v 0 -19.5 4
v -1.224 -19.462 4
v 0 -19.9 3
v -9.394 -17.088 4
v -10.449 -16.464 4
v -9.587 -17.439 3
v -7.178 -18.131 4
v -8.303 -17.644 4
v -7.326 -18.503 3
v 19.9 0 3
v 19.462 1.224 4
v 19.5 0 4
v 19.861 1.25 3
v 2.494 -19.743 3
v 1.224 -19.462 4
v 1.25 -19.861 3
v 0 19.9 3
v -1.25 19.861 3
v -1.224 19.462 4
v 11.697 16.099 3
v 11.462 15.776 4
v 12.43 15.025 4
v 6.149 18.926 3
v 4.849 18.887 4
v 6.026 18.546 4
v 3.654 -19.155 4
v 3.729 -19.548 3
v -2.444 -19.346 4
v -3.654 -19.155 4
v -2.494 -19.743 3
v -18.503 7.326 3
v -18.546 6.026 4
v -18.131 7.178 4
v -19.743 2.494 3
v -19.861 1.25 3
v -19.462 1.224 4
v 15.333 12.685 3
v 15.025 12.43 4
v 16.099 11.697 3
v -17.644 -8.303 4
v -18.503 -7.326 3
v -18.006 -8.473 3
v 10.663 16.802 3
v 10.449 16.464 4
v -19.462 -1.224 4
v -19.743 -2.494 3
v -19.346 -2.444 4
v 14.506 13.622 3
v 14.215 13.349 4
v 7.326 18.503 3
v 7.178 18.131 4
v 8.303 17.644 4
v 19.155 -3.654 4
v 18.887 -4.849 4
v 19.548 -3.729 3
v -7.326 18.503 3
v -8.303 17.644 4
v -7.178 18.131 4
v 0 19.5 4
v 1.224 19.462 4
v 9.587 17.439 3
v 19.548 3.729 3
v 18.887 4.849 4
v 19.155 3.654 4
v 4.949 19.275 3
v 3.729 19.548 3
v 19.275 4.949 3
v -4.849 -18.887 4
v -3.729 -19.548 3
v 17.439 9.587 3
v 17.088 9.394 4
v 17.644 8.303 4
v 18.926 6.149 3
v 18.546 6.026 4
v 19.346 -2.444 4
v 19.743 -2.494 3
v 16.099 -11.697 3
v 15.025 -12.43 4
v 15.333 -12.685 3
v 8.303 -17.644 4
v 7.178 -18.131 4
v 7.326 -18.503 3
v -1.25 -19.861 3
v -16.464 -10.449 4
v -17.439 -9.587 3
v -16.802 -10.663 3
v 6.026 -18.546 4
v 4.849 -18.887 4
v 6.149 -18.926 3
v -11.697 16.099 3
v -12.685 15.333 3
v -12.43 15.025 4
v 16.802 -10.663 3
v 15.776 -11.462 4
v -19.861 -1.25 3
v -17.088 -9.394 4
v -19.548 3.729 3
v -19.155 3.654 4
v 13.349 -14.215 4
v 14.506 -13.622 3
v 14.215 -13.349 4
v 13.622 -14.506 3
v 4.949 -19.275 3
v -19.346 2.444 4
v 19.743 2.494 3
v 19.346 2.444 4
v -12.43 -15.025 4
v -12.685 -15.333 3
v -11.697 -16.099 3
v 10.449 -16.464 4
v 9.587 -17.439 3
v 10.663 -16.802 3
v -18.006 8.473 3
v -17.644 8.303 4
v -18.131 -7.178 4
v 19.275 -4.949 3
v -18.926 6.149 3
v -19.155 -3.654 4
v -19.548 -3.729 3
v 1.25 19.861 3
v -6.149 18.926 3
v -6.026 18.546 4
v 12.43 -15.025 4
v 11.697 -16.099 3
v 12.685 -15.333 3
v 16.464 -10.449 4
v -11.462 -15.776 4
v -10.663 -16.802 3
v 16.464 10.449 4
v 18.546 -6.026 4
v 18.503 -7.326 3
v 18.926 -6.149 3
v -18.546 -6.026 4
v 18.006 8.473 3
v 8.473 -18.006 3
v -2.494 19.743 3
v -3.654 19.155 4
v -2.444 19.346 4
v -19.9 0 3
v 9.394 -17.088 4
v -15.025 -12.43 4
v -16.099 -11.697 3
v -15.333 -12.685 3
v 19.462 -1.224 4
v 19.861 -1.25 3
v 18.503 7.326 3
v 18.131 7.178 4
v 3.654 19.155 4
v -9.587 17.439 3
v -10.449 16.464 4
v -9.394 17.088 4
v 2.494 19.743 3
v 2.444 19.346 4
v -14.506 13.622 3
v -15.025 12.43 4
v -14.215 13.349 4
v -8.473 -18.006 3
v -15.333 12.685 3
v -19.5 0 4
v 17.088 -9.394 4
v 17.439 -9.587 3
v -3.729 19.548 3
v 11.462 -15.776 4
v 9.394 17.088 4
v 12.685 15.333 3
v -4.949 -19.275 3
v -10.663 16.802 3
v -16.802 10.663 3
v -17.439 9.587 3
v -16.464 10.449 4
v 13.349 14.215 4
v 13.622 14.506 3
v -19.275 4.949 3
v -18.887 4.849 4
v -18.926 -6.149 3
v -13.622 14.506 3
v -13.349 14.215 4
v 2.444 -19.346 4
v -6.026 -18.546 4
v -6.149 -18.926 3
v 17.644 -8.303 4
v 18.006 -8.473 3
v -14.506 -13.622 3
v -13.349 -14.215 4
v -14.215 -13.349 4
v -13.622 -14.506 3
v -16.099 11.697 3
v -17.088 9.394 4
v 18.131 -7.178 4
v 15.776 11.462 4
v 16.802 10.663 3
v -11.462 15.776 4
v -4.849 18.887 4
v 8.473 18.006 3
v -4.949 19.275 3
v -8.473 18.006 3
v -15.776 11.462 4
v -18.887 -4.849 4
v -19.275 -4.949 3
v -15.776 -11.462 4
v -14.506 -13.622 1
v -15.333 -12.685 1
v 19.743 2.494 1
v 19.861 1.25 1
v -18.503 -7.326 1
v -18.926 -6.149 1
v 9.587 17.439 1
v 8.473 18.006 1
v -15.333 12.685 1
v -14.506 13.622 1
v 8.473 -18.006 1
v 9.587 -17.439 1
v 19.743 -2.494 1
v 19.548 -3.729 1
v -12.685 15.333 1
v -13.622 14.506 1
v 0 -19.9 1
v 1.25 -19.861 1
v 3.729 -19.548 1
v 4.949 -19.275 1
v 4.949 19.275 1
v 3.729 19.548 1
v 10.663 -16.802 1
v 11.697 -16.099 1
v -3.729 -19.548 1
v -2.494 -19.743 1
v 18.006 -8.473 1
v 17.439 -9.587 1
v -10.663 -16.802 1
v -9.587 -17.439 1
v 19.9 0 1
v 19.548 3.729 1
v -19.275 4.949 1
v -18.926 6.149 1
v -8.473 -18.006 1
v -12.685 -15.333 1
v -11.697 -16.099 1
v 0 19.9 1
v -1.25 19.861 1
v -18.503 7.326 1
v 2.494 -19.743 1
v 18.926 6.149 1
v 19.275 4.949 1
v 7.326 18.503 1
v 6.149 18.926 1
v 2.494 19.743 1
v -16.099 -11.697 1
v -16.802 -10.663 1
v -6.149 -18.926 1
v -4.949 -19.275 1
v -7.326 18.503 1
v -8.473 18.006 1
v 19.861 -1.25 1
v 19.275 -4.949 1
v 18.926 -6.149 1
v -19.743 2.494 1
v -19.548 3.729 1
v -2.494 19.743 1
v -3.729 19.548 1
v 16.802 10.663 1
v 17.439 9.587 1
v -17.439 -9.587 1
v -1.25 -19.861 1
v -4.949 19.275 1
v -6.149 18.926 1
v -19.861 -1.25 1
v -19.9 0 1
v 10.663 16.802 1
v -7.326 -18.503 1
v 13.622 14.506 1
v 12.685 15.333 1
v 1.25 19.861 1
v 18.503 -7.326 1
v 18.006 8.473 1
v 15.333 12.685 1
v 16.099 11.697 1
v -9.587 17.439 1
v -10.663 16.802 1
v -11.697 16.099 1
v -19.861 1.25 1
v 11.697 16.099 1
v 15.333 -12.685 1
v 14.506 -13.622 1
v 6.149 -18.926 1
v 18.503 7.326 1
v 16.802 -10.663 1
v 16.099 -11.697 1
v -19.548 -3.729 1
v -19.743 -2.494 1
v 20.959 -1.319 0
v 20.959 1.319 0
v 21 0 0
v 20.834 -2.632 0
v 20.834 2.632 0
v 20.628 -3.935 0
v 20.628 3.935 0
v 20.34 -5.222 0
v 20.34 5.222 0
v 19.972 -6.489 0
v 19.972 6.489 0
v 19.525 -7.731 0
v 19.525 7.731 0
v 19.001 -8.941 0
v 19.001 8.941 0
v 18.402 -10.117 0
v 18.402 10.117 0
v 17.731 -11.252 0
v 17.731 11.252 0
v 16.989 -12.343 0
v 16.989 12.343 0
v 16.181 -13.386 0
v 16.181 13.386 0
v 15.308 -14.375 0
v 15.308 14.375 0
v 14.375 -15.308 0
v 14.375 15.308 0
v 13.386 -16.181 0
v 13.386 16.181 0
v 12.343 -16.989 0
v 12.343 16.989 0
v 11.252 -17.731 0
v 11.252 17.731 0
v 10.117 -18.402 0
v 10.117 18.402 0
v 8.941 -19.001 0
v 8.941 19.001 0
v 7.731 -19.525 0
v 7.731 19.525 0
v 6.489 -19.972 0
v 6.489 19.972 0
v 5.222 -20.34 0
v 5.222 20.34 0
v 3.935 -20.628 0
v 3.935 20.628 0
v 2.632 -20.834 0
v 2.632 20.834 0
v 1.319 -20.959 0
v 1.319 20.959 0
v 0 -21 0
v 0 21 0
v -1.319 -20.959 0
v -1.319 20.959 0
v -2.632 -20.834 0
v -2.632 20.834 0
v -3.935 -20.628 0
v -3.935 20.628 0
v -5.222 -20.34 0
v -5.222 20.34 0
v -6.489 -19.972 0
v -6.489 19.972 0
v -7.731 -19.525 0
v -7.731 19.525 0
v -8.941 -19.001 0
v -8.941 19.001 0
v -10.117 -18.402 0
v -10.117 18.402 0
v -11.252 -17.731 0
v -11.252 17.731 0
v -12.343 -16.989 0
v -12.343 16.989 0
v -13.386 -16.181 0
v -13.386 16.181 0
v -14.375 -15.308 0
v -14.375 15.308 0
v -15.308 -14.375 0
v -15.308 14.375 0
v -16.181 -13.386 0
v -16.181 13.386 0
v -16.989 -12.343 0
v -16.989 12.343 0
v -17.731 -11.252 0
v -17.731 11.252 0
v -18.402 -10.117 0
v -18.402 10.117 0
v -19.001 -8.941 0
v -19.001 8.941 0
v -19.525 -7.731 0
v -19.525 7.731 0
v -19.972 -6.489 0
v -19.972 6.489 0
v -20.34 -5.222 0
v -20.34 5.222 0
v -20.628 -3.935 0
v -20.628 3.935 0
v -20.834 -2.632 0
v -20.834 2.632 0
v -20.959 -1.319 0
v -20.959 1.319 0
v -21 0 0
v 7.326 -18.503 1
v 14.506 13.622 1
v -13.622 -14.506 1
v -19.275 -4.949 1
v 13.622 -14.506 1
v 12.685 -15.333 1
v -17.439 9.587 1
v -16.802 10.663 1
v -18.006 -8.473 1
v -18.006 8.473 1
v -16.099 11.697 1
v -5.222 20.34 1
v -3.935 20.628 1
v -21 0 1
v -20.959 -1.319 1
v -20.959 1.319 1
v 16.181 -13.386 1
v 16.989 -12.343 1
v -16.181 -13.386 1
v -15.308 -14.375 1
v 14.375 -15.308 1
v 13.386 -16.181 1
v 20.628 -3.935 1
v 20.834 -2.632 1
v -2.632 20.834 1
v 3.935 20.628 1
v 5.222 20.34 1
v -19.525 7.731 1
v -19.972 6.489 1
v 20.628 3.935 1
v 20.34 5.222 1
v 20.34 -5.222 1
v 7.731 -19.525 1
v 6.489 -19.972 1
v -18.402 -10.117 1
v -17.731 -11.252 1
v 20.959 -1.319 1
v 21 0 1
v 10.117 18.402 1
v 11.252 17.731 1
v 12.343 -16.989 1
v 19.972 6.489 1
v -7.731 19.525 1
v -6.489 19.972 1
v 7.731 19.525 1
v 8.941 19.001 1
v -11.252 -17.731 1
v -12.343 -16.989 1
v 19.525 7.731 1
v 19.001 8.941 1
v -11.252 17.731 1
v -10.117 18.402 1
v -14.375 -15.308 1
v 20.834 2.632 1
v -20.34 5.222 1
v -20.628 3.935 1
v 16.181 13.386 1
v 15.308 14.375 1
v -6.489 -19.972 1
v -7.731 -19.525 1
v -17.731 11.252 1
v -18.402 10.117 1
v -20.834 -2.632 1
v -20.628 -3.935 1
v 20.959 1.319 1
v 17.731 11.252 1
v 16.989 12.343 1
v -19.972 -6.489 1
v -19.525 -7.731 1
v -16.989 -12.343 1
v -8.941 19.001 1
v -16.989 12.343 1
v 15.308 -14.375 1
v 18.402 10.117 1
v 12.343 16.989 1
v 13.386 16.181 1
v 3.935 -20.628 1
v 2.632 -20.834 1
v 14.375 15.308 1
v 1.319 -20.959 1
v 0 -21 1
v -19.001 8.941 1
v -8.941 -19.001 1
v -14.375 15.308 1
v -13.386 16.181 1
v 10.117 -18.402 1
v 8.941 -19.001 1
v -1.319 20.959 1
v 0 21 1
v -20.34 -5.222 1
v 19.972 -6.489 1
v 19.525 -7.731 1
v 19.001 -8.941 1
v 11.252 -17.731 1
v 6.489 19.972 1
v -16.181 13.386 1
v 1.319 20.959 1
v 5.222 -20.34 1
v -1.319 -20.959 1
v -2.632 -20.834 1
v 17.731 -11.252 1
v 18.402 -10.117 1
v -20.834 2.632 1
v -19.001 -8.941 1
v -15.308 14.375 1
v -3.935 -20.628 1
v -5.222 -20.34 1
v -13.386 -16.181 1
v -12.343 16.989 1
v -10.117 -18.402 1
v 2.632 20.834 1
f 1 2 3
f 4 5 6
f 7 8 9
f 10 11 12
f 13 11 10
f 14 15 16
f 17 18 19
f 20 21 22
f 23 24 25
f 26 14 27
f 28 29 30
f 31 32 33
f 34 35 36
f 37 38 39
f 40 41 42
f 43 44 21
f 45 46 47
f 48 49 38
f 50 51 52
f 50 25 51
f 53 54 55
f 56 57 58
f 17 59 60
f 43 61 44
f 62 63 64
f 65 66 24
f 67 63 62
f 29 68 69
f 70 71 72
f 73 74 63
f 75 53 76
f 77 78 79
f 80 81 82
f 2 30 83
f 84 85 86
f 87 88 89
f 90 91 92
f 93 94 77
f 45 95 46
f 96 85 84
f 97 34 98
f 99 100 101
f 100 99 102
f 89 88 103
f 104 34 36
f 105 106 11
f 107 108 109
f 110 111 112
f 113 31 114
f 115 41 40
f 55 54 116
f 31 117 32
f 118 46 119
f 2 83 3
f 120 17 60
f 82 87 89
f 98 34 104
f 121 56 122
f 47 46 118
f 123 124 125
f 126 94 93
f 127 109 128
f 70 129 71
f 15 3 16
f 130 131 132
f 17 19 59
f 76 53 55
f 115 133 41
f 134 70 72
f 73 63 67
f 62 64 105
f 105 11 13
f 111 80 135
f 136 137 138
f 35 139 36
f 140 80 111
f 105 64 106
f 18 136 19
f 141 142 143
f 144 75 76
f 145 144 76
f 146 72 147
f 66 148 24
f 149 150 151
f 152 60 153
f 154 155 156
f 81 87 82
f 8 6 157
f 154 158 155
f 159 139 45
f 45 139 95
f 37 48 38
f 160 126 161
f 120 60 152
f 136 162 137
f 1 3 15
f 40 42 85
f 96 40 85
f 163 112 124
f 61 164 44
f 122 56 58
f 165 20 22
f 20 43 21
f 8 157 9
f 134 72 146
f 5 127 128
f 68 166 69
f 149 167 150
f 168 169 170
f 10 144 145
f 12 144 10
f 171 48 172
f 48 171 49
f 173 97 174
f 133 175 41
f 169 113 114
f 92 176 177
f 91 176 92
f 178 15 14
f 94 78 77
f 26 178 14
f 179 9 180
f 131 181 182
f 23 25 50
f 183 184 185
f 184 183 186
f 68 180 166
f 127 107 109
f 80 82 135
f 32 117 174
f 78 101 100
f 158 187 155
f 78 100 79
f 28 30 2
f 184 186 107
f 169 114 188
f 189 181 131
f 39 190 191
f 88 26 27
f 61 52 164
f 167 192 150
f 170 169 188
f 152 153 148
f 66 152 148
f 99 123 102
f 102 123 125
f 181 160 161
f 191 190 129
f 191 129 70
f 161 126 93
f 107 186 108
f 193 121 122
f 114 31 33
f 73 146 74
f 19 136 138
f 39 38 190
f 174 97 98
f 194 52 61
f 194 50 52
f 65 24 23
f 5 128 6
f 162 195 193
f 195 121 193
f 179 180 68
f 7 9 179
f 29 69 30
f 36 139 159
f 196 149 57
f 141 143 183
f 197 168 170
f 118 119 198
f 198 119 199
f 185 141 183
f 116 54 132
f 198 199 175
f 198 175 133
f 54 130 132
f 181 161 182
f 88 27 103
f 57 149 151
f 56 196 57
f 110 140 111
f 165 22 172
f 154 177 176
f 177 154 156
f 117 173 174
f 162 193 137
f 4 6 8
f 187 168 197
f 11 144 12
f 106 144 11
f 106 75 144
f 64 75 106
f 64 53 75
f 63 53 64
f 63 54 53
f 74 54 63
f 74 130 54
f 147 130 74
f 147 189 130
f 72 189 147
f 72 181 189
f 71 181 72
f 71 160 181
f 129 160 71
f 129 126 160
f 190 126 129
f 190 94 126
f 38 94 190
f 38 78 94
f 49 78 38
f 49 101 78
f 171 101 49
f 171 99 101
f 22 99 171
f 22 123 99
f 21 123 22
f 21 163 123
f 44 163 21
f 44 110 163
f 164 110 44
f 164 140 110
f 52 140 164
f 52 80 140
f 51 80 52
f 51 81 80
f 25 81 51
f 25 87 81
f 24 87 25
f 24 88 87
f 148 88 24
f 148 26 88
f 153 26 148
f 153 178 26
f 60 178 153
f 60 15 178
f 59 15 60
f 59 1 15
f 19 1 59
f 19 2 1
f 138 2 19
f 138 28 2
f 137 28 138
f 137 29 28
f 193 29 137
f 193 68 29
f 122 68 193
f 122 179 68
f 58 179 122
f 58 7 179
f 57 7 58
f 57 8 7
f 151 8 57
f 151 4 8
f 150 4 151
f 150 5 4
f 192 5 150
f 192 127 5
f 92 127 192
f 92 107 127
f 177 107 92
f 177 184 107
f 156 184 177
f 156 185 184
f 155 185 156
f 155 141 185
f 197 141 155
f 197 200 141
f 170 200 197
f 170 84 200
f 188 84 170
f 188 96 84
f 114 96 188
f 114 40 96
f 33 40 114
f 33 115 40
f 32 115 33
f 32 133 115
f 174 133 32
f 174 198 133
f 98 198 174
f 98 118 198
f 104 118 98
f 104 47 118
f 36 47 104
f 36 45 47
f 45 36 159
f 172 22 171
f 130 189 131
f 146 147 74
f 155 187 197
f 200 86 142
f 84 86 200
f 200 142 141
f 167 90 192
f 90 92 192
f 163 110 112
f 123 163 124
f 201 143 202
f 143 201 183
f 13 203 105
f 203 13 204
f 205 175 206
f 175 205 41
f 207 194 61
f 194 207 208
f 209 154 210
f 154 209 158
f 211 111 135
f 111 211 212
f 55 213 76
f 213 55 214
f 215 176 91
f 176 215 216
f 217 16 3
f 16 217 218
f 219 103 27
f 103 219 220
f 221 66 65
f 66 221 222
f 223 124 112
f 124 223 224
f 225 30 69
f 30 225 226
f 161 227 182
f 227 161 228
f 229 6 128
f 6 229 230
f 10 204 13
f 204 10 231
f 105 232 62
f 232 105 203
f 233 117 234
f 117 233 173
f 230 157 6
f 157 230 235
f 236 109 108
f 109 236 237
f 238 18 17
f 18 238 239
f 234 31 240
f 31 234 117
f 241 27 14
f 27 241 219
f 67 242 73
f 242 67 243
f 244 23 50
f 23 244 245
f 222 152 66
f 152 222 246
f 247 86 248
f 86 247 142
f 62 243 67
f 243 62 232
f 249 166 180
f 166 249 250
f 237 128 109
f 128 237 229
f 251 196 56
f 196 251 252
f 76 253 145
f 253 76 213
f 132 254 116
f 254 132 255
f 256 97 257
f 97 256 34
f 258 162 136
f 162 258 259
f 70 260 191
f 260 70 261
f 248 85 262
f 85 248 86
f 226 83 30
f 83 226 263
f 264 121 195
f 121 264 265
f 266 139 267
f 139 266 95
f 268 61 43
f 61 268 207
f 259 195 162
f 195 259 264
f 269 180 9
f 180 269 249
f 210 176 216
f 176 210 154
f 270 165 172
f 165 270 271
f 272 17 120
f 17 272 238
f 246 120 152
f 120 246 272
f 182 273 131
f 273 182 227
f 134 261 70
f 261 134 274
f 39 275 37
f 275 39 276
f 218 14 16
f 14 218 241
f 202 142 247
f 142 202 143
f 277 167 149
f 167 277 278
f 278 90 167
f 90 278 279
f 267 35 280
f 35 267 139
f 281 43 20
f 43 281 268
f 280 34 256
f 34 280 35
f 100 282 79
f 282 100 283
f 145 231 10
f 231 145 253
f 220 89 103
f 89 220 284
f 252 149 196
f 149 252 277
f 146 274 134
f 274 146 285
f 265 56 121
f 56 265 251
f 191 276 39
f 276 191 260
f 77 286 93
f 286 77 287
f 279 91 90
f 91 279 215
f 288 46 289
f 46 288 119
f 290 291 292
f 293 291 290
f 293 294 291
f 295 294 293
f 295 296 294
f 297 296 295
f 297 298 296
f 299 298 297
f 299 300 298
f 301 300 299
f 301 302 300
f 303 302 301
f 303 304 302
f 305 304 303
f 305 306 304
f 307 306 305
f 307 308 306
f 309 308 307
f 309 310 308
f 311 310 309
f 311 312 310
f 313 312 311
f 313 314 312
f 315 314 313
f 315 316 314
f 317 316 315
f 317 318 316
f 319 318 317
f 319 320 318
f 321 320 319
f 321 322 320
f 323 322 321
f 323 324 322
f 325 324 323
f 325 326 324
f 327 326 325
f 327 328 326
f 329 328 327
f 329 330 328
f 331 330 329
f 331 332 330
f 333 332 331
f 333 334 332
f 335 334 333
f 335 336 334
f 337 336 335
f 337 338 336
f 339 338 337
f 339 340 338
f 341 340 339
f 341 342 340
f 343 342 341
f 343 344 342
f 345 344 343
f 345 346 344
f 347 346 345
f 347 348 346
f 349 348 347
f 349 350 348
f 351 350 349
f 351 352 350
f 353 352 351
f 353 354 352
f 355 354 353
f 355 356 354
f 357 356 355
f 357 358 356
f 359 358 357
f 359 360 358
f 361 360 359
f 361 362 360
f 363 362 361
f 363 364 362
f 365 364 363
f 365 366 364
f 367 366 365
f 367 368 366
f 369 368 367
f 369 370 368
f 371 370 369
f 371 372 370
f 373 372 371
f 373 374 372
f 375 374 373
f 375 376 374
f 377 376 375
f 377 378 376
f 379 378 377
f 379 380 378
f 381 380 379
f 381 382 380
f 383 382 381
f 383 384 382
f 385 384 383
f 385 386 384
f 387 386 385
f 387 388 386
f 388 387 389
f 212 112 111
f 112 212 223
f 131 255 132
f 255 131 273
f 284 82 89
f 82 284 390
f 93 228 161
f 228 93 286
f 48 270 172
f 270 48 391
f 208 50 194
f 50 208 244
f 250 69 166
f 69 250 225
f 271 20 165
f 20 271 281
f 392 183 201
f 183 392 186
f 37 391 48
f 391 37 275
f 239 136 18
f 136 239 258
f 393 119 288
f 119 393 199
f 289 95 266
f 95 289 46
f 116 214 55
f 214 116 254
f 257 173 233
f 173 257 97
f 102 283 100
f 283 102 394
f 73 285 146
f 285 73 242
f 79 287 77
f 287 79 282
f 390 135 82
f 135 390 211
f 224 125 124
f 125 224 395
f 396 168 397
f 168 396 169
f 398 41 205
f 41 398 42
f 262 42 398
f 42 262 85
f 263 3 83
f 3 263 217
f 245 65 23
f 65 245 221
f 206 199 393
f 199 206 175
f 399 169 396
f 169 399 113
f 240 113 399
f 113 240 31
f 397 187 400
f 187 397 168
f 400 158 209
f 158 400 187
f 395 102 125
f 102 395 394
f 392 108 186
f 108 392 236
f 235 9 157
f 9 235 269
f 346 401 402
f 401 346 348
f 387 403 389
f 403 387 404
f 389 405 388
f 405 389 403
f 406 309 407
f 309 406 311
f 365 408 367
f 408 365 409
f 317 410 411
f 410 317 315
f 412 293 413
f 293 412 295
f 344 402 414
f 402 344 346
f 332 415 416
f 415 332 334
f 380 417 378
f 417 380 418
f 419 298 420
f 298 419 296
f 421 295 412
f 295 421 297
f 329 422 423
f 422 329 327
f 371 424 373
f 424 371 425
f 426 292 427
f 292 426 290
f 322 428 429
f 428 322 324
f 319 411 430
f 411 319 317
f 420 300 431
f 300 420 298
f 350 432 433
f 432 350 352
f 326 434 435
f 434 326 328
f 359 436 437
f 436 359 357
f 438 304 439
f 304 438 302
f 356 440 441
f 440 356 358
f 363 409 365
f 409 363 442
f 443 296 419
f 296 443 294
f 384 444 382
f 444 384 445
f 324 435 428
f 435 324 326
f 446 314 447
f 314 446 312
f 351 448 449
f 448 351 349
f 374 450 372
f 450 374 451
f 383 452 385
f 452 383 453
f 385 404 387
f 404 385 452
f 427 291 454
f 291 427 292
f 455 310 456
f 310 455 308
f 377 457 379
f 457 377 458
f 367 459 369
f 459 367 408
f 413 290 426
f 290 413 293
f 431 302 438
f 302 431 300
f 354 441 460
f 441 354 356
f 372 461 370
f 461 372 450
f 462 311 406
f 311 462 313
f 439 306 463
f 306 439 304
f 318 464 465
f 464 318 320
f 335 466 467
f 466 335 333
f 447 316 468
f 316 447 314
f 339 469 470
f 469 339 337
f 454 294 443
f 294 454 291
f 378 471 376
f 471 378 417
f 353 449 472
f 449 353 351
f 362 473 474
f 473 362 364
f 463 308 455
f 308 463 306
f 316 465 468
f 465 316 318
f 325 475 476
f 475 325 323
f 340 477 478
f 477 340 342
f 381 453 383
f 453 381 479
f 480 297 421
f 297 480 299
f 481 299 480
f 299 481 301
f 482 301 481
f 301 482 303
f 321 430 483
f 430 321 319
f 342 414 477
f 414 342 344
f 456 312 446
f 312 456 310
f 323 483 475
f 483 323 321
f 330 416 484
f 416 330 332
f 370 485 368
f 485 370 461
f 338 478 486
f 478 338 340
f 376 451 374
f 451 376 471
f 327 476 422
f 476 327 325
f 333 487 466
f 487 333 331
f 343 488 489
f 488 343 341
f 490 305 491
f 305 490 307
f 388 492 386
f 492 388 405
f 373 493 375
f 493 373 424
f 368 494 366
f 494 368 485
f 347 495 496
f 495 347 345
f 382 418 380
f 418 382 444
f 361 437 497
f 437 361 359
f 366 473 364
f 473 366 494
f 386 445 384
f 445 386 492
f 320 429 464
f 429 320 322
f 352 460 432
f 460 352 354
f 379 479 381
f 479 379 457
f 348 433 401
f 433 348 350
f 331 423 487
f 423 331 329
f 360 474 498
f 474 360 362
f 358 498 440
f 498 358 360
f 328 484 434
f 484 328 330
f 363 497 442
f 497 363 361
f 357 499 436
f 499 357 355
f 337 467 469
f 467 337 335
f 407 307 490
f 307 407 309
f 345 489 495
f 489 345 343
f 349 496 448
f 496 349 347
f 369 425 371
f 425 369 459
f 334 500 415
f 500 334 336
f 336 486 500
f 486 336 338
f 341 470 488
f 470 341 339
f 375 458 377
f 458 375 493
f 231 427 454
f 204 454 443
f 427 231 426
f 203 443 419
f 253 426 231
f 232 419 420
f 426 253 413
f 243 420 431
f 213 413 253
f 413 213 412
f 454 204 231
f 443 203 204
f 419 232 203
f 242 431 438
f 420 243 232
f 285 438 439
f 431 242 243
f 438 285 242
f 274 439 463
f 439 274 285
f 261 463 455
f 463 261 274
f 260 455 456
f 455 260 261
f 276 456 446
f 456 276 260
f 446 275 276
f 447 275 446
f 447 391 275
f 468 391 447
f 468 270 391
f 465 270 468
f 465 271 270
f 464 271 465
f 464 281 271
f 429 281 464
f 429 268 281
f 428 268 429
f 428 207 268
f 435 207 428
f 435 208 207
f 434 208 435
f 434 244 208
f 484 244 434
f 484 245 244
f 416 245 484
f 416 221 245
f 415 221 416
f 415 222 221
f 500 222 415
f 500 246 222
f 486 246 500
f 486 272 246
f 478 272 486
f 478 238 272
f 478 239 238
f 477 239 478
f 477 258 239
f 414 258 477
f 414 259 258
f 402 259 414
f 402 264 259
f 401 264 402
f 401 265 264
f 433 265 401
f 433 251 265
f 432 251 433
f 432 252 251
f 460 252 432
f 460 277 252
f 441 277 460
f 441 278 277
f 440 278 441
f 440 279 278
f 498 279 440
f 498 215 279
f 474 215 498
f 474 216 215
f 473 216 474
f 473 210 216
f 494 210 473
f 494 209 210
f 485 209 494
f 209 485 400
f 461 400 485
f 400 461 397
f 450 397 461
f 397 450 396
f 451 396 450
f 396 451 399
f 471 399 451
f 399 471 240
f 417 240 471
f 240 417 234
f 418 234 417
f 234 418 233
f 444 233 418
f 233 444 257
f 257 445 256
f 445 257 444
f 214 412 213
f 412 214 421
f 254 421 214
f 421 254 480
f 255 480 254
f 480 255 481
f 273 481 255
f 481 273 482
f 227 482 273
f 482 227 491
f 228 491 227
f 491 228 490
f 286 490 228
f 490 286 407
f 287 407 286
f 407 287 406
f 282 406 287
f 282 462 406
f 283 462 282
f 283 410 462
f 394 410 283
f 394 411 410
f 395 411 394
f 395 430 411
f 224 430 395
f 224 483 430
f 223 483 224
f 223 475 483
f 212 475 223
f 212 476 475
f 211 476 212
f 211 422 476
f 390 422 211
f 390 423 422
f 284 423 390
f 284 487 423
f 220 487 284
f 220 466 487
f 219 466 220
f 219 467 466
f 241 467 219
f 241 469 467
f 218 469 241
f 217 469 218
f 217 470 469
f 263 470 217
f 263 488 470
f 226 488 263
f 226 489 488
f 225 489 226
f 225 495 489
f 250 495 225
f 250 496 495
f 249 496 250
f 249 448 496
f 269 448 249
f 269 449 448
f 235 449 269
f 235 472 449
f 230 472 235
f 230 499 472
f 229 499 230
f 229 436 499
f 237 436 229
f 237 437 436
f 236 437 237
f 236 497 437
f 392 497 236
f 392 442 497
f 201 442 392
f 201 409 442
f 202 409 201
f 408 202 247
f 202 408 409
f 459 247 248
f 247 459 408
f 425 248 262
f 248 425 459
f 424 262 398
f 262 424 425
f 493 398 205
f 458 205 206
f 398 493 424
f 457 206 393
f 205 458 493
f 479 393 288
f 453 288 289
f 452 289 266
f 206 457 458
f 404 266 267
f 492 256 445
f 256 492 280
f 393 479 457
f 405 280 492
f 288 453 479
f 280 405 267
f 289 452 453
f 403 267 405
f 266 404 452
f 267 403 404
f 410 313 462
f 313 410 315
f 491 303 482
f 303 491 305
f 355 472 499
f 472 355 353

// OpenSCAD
// PLug for the toilet paper roll
// License GNU AFFERO GENERAL PUBLIC LICENSE v3+
// Copyright 2014 Christian Ege <k4230r6@gmail.com>

$fn=100;
translate([0,0,3])cylinder(r1=39.8/2,r2=39/2, h=1);
cylinder(r=39.8/2,h=3);
cylinder(r=42/2,h=1);
